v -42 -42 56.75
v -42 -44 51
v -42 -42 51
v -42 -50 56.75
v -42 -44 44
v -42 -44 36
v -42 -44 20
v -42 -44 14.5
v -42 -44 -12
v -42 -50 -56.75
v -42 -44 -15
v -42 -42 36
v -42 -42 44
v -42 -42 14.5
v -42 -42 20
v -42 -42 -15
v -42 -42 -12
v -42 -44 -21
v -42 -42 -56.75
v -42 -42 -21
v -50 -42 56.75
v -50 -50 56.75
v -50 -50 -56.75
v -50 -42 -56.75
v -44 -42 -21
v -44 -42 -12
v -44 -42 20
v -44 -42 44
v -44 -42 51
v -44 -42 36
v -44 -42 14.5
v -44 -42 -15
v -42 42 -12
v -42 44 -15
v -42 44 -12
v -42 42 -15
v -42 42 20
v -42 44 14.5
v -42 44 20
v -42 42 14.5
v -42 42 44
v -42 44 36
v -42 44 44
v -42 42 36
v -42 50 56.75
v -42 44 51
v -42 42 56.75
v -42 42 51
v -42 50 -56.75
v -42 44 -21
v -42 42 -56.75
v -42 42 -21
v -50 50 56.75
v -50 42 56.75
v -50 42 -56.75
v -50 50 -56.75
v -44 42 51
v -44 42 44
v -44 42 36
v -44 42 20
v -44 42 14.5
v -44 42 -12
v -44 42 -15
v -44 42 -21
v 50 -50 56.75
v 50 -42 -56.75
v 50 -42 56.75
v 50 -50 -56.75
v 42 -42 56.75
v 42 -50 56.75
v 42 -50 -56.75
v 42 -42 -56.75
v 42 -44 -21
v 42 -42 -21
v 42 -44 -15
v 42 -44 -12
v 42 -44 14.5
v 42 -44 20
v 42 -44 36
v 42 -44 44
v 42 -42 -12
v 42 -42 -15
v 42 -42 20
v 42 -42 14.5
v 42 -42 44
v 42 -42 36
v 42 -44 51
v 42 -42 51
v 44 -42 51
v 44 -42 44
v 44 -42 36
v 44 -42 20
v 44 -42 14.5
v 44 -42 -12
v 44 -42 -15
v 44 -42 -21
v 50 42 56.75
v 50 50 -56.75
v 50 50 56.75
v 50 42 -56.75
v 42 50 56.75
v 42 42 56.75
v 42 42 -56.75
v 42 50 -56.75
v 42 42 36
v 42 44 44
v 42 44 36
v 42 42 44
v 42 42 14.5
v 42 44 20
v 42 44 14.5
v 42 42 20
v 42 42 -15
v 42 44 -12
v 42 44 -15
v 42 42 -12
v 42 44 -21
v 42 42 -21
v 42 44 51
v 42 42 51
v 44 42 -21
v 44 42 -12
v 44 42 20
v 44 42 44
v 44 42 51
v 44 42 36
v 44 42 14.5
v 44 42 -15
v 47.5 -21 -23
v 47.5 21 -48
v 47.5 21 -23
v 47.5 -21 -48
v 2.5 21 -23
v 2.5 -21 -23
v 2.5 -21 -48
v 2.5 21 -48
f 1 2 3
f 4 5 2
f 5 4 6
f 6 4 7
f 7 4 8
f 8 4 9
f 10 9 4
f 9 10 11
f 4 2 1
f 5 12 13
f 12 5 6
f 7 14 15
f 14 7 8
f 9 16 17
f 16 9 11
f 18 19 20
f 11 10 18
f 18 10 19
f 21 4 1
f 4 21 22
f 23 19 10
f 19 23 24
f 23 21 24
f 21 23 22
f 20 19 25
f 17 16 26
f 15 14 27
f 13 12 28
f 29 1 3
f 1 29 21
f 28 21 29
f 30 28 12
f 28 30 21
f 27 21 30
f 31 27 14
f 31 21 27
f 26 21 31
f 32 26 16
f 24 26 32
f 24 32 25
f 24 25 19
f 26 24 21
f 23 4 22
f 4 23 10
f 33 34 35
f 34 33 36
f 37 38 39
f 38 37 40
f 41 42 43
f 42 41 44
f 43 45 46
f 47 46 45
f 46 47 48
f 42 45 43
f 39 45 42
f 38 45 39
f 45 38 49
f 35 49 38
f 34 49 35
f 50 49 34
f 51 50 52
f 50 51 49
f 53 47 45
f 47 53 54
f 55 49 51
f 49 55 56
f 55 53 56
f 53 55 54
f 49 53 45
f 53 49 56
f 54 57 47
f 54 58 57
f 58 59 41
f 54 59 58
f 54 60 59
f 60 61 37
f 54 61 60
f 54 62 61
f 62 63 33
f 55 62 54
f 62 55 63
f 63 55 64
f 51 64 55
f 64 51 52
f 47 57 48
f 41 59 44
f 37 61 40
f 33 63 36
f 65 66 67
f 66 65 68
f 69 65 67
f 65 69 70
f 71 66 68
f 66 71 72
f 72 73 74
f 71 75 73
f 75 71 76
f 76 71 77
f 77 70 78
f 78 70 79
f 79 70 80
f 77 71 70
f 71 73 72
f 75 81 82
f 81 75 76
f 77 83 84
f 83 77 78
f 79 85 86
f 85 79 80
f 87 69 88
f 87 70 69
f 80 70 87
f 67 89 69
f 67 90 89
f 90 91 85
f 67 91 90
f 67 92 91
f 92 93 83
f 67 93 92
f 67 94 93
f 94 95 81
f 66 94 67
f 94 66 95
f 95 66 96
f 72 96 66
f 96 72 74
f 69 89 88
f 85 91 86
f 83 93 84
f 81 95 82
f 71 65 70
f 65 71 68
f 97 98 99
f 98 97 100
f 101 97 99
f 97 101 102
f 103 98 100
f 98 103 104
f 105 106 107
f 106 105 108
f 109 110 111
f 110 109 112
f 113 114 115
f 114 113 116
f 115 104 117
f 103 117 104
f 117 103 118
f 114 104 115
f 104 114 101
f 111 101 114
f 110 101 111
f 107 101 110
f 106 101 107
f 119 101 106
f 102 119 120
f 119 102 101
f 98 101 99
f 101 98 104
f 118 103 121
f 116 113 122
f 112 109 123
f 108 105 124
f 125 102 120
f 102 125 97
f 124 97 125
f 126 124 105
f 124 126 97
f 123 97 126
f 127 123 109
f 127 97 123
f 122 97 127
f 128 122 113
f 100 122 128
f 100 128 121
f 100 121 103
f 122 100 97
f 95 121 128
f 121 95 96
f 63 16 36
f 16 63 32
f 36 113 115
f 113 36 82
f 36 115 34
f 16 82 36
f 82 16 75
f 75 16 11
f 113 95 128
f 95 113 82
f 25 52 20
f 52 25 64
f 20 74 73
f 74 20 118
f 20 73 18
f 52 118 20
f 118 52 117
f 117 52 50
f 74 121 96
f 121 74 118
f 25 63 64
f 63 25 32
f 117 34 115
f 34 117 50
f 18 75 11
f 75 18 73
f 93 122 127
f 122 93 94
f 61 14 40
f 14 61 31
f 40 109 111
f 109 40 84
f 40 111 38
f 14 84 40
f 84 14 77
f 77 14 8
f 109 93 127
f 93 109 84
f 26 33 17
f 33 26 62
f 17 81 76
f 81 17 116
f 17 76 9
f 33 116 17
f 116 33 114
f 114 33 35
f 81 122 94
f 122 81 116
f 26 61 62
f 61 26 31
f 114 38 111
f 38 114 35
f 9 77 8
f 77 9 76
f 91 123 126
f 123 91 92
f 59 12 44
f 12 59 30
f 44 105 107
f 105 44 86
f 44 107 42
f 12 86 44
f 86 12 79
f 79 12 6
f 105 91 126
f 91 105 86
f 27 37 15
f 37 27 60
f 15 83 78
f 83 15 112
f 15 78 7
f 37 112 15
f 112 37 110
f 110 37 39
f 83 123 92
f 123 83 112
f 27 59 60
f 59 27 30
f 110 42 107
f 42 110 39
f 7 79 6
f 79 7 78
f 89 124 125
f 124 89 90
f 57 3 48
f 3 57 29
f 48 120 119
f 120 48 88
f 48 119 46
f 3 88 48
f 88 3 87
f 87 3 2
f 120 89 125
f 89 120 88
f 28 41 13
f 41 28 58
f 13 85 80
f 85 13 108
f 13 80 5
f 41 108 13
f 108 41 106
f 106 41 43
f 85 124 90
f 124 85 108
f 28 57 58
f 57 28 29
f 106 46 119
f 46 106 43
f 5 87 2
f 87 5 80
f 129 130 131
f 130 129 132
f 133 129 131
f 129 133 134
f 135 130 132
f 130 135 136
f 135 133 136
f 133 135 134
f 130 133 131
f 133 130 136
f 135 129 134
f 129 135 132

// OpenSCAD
// Degen-1 Rev A: visual allocation only. Units mm. NOT manufacturing CAD.
// Origin at nominal geometric center; camera optical axis +X.
module box(lo,hi,col){color(col)translate([0,0,(lo+hi)/2])cube([88,88,hi-lo],center=true);}
color([.4,.45,.5])for(x=[-46,46])for(y=[-46,46])translate([x,y,0])cube([8,8,113.5],center=true);
box(-21,-15,[.7,.5,.8]); // adapter envelope
box(-12,14.5,[.4,.7,.6]); // EPS/battery envelope
box(20,36,[.4,.6,.85]); // carrier and top-side avionics allocation
box(44,51,[.7,.75,.8]); // AntS allocation, not actual mechanism
color([.9,.65,.3])translate([25,0,-35.5])cube([45,42,25],center=true);
// Six panel placeholders omitted where they obscure internal view.
